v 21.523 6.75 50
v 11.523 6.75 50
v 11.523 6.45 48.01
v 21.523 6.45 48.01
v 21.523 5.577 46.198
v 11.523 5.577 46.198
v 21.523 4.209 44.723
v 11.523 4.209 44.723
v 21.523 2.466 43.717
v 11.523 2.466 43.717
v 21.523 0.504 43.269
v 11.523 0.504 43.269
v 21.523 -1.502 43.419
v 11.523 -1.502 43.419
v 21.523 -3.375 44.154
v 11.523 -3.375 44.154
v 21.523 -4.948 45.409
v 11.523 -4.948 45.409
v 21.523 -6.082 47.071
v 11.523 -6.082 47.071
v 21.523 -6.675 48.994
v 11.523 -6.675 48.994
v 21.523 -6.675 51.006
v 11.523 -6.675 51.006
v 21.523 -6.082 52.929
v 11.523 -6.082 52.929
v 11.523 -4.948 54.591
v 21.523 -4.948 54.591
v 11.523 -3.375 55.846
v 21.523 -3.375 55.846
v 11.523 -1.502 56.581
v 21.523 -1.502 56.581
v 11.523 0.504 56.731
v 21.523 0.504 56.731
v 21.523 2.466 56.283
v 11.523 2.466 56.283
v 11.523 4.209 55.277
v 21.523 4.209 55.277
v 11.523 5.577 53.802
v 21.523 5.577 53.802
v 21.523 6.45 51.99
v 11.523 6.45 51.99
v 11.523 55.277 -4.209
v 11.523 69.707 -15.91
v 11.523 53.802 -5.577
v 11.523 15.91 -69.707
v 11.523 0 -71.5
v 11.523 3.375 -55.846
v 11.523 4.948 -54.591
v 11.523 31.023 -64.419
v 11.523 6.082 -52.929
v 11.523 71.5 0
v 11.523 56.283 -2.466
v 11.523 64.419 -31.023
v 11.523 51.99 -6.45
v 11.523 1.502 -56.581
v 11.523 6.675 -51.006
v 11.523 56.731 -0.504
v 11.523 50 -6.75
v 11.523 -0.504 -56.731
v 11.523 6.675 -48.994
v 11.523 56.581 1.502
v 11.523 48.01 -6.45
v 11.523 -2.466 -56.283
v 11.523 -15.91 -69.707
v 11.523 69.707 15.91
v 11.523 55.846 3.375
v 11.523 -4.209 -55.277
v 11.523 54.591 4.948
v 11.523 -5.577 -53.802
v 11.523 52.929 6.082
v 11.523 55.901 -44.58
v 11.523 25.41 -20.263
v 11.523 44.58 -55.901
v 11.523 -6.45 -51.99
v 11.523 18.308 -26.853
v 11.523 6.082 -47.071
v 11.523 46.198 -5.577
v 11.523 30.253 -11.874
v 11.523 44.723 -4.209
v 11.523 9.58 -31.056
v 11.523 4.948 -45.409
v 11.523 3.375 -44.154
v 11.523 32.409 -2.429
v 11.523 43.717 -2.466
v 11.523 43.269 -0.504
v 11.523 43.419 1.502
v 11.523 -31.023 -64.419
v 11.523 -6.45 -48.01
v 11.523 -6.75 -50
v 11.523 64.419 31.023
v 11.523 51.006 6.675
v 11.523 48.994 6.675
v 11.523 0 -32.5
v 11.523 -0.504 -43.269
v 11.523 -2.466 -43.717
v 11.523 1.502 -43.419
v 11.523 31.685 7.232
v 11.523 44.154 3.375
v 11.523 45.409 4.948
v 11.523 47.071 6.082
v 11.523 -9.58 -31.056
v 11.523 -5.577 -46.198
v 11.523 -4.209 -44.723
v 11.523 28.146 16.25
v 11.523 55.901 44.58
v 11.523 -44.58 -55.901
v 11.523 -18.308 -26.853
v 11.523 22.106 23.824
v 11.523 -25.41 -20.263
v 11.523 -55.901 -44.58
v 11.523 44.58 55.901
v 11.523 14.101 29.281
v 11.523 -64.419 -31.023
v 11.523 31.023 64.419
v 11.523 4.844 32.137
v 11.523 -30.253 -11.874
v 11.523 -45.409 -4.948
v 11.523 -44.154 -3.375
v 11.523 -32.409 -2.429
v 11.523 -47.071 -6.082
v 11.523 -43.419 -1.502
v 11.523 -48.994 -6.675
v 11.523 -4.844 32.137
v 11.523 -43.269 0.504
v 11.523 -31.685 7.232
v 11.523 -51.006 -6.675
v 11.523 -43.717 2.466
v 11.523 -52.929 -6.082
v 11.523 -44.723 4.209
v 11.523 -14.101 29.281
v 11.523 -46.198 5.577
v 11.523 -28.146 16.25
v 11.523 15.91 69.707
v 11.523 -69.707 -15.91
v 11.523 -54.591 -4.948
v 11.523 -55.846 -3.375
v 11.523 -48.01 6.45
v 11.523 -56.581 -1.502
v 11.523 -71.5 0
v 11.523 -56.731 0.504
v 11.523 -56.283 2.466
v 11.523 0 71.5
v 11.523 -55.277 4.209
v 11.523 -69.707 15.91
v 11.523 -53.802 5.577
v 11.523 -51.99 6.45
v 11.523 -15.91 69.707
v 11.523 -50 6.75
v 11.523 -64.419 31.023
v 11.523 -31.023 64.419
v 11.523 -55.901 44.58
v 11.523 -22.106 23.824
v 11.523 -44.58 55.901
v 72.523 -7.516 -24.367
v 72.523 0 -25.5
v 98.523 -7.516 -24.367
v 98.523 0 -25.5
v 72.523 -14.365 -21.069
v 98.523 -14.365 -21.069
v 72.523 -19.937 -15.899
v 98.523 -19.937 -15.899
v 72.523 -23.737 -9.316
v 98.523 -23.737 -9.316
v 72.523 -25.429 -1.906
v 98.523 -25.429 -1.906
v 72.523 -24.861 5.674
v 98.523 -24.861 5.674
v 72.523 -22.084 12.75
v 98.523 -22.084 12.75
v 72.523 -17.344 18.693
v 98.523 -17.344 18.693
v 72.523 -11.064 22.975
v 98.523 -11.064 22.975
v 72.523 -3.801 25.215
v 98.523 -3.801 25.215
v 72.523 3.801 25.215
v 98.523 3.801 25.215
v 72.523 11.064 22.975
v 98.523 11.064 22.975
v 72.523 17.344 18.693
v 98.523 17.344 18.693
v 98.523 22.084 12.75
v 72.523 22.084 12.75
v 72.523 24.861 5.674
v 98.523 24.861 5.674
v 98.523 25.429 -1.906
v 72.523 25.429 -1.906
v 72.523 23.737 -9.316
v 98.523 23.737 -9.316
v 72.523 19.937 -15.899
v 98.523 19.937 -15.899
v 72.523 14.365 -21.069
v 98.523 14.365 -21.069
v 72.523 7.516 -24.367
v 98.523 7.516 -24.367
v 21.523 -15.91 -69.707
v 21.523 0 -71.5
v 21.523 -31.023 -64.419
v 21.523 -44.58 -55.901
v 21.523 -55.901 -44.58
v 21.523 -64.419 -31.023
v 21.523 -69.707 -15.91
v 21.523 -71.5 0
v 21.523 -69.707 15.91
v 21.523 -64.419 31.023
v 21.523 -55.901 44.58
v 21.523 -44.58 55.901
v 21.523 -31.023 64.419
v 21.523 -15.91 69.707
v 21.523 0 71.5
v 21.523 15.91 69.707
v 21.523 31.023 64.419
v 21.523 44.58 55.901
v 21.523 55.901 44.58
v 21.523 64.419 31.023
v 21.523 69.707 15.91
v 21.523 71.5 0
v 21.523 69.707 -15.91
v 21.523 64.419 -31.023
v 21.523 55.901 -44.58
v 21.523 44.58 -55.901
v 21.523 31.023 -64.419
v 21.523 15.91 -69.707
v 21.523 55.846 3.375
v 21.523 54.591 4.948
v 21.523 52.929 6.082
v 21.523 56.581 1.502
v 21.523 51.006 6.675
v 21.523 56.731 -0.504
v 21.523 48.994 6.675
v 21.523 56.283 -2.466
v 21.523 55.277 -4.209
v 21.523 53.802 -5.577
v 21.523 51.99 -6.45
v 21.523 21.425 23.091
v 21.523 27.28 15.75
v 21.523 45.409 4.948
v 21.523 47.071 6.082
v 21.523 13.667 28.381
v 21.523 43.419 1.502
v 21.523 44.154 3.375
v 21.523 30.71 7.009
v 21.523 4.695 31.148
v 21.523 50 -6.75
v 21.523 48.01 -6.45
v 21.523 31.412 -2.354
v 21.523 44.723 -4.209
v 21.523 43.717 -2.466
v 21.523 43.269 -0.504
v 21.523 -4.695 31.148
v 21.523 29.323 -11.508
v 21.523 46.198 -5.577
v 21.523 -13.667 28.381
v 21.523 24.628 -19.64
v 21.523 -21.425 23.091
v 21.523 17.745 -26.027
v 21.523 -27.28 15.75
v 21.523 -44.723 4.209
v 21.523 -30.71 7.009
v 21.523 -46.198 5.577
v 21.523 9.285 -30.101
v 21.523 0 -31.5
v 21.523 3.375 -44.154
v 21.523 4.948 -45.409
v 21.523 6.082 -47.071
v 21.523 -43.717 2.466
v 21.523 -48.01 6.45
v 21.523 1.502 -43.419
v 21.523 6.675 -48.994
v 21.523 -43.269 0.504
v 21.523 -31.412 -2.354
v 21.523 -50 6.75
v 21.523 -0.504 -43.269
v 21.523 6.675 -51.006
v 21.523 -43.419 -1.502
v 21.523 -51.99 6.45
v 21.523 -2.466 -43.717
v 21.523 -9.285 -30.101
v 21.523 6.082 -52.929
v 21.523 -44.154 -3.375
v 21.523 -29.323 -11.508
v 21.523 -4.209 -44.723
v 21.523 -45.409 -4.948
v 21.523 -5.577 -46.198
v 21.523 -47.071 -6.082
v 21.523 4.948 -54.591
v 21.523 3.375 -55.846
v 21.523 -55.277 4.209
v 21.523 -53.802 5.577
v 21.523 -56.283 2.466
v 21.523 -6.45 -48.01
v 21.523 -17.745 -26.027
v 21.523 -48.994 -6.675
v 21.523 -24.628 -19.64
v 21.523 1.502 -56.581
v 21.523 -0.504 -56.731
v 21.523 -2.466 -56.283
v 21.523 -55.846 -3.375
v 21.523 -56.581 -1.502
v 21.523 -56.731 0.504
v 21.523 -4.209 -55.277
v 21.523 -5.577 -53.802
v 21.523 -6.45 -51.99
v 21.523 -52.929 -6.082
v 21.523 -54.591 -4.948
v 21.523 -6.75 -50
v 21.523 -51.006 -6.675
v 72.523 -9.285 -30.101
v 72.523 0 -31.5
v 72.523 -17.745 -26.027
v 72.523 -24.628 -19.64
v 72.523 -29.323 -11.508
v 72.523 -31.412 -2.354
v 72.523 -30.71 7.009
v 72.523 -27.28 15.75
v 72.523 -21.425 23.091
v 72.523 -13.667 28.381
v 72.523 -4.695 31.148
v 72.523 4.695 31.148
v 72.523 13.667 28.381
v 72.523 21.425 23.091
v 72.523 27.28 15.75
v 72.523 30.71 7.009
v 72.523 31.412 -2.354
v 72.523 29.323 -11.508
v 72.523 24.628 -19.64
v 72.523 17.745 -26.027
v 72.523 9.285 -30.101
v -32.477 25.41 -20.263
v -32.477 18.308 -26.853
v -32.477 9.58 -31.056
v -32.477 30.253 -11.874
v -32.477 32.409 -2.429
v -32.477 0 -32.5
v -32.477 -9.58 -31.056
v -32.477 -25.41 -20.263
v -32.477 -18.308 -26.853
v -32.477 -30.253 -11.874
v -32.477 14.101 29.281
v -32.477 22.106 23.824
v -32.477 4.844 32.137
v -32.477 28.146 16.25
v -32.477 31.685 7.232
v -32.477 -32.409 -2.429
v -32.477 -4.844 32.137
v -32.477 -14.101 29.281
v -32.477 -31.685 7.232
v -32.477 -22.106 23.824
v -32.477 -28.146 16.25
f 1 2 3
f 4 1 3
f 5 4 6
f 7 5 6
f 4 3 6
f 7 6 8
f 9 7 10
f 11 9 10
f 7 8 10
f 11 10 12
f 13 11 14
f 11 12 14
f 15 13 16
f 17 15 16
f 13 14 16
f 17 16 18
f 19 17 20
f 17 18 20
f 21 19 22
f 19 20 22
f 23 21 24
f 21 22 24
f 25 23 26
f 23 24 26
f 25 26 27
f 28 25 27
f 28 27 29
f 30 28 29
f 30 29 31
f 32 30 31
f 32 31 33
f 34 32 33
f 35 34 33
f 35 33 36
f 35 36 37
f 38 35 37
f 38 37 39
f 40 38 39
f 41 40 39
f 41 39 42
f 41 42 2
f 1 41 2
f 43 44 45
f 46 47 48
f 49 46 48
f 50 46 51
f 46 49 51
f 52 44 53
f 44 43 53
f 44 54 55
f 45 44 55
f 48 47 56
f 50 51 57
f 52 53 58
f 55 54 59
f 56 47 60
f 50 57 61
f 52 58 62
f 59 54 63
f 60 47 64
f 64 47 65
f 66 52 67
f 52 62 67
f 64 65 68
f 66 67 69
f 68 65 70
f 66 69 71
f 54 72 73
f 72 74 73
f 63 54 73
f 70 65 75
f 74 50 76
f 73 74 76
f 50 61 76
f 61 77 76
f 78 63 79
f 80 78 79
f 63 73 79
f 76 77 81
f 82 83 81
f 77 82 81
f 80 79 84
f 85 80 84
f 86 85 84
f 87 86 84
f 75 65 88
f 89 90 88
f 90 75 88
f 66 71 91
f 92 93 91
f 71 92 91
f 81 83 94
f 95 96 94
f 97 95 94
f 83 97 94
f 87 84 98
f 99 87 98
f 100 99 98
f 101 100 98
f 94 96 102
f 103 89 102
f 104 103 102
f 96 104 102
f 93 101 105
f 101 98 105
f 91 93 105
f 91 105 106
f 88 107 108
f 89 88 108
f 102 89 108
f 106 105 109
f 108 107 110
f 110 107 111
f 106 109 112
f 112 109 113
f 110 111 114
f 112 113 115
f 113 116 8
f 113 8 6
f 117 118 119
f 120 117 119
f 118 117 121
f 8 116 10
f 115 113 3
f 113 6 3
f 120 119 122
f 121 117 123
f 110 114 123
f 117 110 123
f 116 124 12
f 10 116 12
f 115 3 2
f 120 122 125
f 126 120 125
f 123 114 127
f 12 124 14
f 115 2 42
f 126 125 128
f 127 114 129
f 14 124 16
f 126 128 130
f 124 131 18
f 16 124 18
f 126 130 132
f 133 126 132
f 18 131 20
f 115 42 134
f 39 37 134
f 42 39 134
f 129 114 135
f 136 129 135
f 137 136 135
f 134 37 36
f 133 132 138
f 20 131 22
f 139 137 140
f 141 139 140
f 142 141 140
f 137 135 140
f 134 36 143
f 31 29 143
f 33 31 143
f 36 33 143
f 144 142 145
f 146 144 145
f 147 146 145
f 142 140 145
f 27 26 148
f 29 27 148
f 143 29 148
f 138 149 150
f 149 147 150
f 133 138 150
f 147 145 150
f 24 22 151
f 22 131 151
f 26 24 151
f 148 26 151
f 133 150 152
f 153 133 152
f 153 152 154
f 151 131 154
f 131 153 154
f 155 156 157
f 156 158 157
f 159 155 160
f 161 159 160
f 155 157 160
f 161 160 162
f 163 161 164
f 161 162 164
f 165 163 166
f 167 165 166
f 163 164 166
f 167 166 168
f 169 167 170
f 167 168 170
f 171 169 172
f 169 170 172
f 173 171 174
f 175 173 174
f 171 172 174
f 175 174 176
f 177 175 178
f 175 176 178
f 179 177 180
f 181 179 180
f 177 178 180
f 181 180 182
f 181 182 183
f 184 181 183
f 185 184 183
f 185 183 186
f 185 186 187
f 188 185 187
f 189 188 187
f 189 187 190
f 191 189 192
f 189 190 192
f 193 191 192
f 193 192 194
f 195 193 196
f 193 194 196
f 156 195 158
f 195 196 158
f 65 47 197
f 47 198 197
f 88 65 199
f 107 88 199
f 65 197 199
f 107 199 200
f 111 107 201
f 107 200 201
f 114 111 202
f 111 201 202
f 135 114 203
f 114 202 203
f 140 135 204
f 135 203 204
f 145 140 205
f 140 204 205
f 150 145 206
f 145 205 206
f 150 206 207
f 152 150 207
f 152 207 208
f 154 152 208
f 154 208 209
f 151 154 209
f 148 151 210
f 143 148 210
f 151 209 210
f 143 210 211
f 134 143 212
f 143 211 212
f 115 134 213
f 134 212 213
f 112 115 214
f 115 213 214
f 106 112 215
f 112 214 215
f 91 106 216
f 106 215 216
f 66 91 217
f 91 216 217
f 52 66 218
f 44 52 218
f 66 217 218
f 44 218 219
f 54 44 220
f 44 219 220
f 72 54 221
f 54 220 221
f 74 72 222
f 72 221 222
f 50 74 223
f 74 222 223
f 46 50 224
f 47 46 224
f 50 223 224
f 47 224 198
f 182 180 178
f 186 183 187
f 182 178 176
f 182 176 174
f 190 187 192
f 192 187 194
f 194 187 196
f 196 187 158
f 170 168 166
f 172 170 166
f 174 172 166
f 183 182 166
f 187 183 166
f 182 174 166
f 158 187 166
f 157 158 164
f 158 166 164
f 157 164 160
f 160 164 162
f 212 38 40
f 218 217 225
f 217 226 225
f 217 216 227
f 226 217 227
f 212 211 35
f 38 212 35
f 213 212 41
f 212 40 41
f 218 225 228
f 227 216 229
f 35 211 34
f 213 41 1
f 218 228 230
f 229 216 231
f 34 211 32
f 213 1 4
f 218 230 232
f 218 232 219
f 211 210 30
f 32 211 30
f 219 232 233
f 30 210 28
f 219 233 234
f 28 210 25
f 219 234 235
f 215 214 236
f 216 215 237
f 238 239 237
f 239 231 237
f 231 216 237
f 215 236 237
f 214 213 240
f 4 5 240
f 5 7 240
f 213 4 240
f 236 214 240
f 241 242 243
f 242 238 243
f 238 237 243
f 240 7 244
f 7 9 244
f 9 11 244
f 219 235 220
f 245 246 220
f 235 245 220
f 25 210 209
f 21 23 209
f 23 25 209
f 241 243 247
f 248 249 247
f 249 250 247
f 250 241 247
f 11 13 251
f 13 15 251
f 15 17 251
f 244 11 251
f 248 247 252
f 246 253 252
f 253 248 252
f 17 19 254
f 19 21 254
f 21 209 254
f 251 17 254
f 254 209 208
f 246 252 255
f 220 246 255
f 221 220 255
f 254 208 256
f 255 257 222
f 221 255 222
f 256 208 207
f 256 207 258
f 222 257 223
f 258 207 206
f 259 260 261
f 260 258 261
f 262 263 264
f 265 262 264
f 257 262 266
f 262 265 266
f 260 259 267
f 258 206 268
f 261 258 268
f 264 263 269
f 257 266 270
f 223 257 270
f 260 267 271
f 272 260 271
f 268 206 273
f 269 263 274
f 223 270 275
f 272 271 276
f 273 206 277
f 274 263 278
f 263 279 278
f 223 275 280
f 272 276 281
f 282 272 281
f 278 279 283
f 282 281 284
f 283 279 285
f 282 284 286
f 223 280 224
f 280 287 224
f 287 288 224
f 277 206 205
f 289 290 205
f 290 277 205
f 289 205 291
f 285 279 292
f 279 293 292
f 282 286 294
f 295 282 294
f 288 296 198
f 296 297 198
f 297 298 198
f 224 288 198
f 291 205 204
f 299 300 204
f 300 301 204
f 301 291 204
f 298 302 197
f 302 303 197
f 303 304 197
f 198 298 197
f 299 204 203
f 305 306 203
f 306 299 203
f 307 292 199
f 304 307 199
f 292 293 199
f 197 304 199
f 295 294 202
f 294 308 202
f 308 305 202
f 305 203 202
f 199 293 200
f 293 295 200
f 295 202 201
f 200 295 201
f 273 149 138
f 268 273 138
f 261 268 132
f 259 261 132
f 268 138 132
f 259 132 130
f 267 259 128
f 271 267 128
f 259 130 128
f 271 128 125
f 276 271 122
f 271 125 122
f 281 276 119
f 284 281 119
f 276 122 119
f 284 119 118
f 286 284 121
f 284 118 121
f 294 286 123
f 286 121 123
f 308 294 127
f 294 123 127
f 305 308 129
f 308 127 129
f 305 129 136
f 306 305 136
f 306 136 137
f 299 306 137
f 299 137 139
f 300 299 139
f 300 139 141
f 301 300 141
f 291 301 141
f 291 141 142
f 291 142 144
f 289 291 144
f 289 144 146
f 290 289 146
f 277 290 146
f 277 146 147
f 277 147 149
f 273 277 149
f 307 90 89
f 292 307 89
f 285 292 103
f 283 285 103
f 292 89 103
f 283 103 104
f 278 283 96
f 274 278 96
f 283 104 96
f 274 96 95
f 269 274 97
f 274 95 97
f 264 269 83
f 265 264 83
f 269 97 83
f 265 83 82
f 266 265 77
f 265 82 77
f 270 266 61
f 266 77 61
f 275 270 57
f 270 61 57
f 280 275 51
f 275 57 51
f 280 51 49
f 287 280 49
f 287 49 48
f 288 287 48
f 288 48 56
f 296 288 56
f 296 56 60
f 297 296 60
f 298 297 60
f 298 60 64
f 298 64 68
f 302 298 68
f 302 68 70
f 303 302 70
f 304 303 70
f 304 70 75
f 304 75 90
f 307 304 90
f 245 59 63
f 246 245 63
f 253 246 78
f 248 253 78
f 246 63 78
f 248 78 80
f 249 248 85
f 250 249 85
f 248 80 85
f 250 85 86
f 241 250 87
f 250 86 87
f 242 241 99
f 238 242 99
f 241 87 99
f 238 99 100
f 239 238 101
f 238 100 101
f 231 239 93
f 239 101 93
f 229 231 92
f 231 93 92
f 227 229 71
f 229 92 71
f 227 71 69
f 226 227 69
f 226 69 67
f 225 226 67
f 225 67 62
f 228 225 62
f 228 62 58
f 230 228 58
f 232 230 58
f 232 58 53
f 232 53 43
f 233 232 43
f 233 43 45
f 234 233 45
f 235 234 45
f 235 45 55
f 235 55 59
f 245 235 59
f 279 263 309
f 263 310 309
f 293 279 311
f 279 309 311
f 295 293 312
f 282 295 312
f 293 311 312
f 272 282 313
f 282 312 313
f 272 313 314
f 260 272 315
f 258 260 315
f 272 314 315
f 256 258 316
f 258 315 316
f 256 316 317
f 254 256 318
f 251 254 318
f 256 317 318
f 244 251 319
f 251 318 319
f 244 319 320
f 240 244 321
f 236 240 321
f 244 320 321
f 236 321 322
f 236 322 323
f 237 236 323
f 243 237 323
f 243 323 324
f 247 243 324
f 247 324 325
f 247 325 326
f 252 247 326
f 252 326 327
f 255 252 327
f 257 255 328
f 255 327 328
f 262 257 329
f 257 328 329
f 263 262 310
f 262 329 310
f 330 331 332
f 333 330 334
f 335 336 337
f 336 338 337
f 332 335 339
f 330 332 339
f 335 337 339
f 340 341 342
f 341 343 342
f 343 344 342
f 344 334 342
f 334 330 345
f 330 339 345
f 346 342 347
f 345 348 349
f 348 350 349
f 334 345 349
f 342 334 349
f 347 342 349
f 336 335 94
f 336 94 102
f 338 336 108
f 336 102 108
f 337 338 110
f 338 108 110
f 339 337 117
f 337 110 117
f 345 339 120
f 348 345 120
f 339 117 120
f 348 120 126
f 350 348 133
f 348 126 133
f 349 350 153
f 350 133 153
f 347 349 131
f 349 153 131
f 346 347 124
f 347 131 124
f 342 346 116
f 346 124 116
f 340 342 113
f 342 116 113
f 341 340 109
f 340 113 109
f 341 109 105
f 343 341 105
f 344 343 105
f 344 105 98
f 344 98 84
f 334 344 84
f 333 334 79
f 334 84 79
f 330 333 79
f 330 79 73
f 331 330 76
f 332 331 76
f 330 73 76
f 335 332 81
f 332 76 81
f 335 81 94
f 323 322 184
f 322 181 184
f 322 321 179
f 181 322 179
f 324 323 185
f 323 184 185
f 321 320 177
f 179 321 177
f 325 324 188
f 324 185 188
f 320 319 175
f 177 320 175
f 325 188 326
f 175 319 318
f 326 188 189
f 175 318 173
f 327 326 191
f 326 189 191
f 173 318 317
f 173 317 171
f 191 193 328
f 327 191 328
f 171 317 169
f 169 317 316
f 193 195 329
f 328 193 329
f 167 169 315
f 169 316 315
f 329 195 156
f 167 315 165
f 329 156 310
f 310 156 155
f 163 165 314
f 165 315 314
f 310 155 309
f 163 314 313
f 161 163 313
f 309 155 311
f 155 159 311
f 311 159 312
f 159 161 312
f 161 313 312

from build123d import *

# Parameters (mm, degrees)
M12_CLEARANCE_HOLE1_D = 13.5
CIRPATTERN1_COUNT     = 4


with BuildPart() as part:
    # Sketch1 → Revolve1 (revolve)
    with BuildSketch(Plane.XY, mode=Mode.PRIVATE) as revolve1_sk:
        Polygon((-32.477216022, 0), (-32.477216022, 32.5), (11.522783978, 32.5), (11.522783978, 71.5), (21.522783978, 71.5), (21.522783978, 31.5), (72.522783978, 31.5), (72.522783978, 25.5), (98.522783978, 25.5), (98.522783978, 0), align=None)
    revolve(revolve1_sk.sketch.rotate(Axis((98.522783978, 0, 0), (-1, 0, 0)), 90), axis=Axis((98.522783978, 0, 0), (-1, 0, 0)))

    # M12 Clearance Hole1 (through all)
    with Locations(Plane(origin=(21.522783978, 50, 0), x_dir=(0, 0, 1), z_dir=(1, 0, 0))):
        with Locations((0, 0)):
            m12_clearance_hole1 = Hole(M12_CLEARANCE_HOLE1_D / 2)

    # CirPattern1: M12 Clearance Hole1 ×4 about axis
    cirpattern1_axis = Axis((0, 0, 0), (1, 0, 0))
    for i in range(1, CIRPATTERN1_COUNT):
        add(m12_clearance_hole1.rotate(cirpattern1_axis, i * 360 / CIRPATTERN1_COUNT), mode=Mode.SUBTRACT)


solid = part.part
